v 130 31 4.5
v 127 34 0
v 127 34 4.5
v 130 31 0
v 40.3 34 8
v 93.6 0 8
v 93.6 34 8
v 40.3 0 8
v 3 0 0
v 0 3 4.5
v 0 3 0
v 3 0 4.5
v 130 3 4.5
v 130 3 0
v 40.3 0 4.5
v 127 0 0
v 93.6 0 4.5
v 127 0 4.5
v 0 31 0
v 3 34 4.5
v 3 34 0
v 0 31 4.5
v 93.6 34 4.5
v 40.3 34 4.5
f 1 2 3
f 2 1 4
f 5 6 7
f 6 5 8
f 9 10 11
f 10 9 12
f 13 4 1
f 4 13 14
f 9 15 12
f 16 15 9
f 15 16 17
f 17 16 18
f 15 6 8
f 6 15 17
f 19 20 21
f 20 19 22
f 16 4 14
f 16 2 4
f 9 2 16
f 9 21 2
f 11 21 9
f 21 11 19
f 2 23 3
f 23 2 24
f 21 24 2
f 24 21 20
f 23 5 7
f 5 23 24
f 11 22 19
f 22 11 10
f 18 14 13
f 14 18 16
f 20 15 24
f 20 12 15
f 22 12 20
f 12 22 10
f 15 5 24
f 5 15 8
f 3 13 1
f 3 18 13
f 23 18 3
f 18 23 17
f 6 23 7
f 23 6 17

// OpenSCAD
$fn = 32;

// ----------------------------------------------------------------------
// Stepped bar: centerstep, 130 x 34 x 8/4.5 mm
// ----------------------------------------------------------------------

// --- parameters (mm) ---
bar_l = 130;              // bar length, X
bar_w = 34;               // bar width, Y
plate_t = 8;              // thickness of the thick zone, Z
thin_t = 4.5;             // thickness of the thin zone
corner_c = 3;             // corner chamfer of the bar
step_cut = 3.5;           // material removed from the thin zone
thick_from = 40.3;        // start of the thick middle zone
thick_to = 93.6;          // end of the thick middle zone
depth_1 = 3.5;            // depth of cut 1 from the top face
depth_2 = 3.5;            // depth of cut 2 from the top face
fit_tol = 0.05;           // declared fit tolerance (prompt contract)
free_tol = 0.3;           // declared free tolerance (prompt contract)

profile = [[3, 0], [127, 0], [130, 3], [130, 31], [127, 34], [3, 34], [0, 31], [0, 3]];  // primary outline, 8 points, counter clockwise
void_1 = [[-1, -1], [40.3, -1], [40.3, 35], [-1, 35]];  // thin left end, 4 points
void_2 = [[93.6, -1], [131, -1], [131, 35], [93.6, 35]];  // thin right end, 4 points

// --- the one profile operation ---
difference() {
  linear_extrude(height = plate_t) polygon(points = profile);
  translate([0, 0, plate_t - depth_1])
    linear_extrude(height = depth_1 + 1) polygon(points = void_1);
  translate([0, 0, plate_t - depth_2])
    linear_extrude(height = depth_2 + 1) polygon(points = void_2);
}
